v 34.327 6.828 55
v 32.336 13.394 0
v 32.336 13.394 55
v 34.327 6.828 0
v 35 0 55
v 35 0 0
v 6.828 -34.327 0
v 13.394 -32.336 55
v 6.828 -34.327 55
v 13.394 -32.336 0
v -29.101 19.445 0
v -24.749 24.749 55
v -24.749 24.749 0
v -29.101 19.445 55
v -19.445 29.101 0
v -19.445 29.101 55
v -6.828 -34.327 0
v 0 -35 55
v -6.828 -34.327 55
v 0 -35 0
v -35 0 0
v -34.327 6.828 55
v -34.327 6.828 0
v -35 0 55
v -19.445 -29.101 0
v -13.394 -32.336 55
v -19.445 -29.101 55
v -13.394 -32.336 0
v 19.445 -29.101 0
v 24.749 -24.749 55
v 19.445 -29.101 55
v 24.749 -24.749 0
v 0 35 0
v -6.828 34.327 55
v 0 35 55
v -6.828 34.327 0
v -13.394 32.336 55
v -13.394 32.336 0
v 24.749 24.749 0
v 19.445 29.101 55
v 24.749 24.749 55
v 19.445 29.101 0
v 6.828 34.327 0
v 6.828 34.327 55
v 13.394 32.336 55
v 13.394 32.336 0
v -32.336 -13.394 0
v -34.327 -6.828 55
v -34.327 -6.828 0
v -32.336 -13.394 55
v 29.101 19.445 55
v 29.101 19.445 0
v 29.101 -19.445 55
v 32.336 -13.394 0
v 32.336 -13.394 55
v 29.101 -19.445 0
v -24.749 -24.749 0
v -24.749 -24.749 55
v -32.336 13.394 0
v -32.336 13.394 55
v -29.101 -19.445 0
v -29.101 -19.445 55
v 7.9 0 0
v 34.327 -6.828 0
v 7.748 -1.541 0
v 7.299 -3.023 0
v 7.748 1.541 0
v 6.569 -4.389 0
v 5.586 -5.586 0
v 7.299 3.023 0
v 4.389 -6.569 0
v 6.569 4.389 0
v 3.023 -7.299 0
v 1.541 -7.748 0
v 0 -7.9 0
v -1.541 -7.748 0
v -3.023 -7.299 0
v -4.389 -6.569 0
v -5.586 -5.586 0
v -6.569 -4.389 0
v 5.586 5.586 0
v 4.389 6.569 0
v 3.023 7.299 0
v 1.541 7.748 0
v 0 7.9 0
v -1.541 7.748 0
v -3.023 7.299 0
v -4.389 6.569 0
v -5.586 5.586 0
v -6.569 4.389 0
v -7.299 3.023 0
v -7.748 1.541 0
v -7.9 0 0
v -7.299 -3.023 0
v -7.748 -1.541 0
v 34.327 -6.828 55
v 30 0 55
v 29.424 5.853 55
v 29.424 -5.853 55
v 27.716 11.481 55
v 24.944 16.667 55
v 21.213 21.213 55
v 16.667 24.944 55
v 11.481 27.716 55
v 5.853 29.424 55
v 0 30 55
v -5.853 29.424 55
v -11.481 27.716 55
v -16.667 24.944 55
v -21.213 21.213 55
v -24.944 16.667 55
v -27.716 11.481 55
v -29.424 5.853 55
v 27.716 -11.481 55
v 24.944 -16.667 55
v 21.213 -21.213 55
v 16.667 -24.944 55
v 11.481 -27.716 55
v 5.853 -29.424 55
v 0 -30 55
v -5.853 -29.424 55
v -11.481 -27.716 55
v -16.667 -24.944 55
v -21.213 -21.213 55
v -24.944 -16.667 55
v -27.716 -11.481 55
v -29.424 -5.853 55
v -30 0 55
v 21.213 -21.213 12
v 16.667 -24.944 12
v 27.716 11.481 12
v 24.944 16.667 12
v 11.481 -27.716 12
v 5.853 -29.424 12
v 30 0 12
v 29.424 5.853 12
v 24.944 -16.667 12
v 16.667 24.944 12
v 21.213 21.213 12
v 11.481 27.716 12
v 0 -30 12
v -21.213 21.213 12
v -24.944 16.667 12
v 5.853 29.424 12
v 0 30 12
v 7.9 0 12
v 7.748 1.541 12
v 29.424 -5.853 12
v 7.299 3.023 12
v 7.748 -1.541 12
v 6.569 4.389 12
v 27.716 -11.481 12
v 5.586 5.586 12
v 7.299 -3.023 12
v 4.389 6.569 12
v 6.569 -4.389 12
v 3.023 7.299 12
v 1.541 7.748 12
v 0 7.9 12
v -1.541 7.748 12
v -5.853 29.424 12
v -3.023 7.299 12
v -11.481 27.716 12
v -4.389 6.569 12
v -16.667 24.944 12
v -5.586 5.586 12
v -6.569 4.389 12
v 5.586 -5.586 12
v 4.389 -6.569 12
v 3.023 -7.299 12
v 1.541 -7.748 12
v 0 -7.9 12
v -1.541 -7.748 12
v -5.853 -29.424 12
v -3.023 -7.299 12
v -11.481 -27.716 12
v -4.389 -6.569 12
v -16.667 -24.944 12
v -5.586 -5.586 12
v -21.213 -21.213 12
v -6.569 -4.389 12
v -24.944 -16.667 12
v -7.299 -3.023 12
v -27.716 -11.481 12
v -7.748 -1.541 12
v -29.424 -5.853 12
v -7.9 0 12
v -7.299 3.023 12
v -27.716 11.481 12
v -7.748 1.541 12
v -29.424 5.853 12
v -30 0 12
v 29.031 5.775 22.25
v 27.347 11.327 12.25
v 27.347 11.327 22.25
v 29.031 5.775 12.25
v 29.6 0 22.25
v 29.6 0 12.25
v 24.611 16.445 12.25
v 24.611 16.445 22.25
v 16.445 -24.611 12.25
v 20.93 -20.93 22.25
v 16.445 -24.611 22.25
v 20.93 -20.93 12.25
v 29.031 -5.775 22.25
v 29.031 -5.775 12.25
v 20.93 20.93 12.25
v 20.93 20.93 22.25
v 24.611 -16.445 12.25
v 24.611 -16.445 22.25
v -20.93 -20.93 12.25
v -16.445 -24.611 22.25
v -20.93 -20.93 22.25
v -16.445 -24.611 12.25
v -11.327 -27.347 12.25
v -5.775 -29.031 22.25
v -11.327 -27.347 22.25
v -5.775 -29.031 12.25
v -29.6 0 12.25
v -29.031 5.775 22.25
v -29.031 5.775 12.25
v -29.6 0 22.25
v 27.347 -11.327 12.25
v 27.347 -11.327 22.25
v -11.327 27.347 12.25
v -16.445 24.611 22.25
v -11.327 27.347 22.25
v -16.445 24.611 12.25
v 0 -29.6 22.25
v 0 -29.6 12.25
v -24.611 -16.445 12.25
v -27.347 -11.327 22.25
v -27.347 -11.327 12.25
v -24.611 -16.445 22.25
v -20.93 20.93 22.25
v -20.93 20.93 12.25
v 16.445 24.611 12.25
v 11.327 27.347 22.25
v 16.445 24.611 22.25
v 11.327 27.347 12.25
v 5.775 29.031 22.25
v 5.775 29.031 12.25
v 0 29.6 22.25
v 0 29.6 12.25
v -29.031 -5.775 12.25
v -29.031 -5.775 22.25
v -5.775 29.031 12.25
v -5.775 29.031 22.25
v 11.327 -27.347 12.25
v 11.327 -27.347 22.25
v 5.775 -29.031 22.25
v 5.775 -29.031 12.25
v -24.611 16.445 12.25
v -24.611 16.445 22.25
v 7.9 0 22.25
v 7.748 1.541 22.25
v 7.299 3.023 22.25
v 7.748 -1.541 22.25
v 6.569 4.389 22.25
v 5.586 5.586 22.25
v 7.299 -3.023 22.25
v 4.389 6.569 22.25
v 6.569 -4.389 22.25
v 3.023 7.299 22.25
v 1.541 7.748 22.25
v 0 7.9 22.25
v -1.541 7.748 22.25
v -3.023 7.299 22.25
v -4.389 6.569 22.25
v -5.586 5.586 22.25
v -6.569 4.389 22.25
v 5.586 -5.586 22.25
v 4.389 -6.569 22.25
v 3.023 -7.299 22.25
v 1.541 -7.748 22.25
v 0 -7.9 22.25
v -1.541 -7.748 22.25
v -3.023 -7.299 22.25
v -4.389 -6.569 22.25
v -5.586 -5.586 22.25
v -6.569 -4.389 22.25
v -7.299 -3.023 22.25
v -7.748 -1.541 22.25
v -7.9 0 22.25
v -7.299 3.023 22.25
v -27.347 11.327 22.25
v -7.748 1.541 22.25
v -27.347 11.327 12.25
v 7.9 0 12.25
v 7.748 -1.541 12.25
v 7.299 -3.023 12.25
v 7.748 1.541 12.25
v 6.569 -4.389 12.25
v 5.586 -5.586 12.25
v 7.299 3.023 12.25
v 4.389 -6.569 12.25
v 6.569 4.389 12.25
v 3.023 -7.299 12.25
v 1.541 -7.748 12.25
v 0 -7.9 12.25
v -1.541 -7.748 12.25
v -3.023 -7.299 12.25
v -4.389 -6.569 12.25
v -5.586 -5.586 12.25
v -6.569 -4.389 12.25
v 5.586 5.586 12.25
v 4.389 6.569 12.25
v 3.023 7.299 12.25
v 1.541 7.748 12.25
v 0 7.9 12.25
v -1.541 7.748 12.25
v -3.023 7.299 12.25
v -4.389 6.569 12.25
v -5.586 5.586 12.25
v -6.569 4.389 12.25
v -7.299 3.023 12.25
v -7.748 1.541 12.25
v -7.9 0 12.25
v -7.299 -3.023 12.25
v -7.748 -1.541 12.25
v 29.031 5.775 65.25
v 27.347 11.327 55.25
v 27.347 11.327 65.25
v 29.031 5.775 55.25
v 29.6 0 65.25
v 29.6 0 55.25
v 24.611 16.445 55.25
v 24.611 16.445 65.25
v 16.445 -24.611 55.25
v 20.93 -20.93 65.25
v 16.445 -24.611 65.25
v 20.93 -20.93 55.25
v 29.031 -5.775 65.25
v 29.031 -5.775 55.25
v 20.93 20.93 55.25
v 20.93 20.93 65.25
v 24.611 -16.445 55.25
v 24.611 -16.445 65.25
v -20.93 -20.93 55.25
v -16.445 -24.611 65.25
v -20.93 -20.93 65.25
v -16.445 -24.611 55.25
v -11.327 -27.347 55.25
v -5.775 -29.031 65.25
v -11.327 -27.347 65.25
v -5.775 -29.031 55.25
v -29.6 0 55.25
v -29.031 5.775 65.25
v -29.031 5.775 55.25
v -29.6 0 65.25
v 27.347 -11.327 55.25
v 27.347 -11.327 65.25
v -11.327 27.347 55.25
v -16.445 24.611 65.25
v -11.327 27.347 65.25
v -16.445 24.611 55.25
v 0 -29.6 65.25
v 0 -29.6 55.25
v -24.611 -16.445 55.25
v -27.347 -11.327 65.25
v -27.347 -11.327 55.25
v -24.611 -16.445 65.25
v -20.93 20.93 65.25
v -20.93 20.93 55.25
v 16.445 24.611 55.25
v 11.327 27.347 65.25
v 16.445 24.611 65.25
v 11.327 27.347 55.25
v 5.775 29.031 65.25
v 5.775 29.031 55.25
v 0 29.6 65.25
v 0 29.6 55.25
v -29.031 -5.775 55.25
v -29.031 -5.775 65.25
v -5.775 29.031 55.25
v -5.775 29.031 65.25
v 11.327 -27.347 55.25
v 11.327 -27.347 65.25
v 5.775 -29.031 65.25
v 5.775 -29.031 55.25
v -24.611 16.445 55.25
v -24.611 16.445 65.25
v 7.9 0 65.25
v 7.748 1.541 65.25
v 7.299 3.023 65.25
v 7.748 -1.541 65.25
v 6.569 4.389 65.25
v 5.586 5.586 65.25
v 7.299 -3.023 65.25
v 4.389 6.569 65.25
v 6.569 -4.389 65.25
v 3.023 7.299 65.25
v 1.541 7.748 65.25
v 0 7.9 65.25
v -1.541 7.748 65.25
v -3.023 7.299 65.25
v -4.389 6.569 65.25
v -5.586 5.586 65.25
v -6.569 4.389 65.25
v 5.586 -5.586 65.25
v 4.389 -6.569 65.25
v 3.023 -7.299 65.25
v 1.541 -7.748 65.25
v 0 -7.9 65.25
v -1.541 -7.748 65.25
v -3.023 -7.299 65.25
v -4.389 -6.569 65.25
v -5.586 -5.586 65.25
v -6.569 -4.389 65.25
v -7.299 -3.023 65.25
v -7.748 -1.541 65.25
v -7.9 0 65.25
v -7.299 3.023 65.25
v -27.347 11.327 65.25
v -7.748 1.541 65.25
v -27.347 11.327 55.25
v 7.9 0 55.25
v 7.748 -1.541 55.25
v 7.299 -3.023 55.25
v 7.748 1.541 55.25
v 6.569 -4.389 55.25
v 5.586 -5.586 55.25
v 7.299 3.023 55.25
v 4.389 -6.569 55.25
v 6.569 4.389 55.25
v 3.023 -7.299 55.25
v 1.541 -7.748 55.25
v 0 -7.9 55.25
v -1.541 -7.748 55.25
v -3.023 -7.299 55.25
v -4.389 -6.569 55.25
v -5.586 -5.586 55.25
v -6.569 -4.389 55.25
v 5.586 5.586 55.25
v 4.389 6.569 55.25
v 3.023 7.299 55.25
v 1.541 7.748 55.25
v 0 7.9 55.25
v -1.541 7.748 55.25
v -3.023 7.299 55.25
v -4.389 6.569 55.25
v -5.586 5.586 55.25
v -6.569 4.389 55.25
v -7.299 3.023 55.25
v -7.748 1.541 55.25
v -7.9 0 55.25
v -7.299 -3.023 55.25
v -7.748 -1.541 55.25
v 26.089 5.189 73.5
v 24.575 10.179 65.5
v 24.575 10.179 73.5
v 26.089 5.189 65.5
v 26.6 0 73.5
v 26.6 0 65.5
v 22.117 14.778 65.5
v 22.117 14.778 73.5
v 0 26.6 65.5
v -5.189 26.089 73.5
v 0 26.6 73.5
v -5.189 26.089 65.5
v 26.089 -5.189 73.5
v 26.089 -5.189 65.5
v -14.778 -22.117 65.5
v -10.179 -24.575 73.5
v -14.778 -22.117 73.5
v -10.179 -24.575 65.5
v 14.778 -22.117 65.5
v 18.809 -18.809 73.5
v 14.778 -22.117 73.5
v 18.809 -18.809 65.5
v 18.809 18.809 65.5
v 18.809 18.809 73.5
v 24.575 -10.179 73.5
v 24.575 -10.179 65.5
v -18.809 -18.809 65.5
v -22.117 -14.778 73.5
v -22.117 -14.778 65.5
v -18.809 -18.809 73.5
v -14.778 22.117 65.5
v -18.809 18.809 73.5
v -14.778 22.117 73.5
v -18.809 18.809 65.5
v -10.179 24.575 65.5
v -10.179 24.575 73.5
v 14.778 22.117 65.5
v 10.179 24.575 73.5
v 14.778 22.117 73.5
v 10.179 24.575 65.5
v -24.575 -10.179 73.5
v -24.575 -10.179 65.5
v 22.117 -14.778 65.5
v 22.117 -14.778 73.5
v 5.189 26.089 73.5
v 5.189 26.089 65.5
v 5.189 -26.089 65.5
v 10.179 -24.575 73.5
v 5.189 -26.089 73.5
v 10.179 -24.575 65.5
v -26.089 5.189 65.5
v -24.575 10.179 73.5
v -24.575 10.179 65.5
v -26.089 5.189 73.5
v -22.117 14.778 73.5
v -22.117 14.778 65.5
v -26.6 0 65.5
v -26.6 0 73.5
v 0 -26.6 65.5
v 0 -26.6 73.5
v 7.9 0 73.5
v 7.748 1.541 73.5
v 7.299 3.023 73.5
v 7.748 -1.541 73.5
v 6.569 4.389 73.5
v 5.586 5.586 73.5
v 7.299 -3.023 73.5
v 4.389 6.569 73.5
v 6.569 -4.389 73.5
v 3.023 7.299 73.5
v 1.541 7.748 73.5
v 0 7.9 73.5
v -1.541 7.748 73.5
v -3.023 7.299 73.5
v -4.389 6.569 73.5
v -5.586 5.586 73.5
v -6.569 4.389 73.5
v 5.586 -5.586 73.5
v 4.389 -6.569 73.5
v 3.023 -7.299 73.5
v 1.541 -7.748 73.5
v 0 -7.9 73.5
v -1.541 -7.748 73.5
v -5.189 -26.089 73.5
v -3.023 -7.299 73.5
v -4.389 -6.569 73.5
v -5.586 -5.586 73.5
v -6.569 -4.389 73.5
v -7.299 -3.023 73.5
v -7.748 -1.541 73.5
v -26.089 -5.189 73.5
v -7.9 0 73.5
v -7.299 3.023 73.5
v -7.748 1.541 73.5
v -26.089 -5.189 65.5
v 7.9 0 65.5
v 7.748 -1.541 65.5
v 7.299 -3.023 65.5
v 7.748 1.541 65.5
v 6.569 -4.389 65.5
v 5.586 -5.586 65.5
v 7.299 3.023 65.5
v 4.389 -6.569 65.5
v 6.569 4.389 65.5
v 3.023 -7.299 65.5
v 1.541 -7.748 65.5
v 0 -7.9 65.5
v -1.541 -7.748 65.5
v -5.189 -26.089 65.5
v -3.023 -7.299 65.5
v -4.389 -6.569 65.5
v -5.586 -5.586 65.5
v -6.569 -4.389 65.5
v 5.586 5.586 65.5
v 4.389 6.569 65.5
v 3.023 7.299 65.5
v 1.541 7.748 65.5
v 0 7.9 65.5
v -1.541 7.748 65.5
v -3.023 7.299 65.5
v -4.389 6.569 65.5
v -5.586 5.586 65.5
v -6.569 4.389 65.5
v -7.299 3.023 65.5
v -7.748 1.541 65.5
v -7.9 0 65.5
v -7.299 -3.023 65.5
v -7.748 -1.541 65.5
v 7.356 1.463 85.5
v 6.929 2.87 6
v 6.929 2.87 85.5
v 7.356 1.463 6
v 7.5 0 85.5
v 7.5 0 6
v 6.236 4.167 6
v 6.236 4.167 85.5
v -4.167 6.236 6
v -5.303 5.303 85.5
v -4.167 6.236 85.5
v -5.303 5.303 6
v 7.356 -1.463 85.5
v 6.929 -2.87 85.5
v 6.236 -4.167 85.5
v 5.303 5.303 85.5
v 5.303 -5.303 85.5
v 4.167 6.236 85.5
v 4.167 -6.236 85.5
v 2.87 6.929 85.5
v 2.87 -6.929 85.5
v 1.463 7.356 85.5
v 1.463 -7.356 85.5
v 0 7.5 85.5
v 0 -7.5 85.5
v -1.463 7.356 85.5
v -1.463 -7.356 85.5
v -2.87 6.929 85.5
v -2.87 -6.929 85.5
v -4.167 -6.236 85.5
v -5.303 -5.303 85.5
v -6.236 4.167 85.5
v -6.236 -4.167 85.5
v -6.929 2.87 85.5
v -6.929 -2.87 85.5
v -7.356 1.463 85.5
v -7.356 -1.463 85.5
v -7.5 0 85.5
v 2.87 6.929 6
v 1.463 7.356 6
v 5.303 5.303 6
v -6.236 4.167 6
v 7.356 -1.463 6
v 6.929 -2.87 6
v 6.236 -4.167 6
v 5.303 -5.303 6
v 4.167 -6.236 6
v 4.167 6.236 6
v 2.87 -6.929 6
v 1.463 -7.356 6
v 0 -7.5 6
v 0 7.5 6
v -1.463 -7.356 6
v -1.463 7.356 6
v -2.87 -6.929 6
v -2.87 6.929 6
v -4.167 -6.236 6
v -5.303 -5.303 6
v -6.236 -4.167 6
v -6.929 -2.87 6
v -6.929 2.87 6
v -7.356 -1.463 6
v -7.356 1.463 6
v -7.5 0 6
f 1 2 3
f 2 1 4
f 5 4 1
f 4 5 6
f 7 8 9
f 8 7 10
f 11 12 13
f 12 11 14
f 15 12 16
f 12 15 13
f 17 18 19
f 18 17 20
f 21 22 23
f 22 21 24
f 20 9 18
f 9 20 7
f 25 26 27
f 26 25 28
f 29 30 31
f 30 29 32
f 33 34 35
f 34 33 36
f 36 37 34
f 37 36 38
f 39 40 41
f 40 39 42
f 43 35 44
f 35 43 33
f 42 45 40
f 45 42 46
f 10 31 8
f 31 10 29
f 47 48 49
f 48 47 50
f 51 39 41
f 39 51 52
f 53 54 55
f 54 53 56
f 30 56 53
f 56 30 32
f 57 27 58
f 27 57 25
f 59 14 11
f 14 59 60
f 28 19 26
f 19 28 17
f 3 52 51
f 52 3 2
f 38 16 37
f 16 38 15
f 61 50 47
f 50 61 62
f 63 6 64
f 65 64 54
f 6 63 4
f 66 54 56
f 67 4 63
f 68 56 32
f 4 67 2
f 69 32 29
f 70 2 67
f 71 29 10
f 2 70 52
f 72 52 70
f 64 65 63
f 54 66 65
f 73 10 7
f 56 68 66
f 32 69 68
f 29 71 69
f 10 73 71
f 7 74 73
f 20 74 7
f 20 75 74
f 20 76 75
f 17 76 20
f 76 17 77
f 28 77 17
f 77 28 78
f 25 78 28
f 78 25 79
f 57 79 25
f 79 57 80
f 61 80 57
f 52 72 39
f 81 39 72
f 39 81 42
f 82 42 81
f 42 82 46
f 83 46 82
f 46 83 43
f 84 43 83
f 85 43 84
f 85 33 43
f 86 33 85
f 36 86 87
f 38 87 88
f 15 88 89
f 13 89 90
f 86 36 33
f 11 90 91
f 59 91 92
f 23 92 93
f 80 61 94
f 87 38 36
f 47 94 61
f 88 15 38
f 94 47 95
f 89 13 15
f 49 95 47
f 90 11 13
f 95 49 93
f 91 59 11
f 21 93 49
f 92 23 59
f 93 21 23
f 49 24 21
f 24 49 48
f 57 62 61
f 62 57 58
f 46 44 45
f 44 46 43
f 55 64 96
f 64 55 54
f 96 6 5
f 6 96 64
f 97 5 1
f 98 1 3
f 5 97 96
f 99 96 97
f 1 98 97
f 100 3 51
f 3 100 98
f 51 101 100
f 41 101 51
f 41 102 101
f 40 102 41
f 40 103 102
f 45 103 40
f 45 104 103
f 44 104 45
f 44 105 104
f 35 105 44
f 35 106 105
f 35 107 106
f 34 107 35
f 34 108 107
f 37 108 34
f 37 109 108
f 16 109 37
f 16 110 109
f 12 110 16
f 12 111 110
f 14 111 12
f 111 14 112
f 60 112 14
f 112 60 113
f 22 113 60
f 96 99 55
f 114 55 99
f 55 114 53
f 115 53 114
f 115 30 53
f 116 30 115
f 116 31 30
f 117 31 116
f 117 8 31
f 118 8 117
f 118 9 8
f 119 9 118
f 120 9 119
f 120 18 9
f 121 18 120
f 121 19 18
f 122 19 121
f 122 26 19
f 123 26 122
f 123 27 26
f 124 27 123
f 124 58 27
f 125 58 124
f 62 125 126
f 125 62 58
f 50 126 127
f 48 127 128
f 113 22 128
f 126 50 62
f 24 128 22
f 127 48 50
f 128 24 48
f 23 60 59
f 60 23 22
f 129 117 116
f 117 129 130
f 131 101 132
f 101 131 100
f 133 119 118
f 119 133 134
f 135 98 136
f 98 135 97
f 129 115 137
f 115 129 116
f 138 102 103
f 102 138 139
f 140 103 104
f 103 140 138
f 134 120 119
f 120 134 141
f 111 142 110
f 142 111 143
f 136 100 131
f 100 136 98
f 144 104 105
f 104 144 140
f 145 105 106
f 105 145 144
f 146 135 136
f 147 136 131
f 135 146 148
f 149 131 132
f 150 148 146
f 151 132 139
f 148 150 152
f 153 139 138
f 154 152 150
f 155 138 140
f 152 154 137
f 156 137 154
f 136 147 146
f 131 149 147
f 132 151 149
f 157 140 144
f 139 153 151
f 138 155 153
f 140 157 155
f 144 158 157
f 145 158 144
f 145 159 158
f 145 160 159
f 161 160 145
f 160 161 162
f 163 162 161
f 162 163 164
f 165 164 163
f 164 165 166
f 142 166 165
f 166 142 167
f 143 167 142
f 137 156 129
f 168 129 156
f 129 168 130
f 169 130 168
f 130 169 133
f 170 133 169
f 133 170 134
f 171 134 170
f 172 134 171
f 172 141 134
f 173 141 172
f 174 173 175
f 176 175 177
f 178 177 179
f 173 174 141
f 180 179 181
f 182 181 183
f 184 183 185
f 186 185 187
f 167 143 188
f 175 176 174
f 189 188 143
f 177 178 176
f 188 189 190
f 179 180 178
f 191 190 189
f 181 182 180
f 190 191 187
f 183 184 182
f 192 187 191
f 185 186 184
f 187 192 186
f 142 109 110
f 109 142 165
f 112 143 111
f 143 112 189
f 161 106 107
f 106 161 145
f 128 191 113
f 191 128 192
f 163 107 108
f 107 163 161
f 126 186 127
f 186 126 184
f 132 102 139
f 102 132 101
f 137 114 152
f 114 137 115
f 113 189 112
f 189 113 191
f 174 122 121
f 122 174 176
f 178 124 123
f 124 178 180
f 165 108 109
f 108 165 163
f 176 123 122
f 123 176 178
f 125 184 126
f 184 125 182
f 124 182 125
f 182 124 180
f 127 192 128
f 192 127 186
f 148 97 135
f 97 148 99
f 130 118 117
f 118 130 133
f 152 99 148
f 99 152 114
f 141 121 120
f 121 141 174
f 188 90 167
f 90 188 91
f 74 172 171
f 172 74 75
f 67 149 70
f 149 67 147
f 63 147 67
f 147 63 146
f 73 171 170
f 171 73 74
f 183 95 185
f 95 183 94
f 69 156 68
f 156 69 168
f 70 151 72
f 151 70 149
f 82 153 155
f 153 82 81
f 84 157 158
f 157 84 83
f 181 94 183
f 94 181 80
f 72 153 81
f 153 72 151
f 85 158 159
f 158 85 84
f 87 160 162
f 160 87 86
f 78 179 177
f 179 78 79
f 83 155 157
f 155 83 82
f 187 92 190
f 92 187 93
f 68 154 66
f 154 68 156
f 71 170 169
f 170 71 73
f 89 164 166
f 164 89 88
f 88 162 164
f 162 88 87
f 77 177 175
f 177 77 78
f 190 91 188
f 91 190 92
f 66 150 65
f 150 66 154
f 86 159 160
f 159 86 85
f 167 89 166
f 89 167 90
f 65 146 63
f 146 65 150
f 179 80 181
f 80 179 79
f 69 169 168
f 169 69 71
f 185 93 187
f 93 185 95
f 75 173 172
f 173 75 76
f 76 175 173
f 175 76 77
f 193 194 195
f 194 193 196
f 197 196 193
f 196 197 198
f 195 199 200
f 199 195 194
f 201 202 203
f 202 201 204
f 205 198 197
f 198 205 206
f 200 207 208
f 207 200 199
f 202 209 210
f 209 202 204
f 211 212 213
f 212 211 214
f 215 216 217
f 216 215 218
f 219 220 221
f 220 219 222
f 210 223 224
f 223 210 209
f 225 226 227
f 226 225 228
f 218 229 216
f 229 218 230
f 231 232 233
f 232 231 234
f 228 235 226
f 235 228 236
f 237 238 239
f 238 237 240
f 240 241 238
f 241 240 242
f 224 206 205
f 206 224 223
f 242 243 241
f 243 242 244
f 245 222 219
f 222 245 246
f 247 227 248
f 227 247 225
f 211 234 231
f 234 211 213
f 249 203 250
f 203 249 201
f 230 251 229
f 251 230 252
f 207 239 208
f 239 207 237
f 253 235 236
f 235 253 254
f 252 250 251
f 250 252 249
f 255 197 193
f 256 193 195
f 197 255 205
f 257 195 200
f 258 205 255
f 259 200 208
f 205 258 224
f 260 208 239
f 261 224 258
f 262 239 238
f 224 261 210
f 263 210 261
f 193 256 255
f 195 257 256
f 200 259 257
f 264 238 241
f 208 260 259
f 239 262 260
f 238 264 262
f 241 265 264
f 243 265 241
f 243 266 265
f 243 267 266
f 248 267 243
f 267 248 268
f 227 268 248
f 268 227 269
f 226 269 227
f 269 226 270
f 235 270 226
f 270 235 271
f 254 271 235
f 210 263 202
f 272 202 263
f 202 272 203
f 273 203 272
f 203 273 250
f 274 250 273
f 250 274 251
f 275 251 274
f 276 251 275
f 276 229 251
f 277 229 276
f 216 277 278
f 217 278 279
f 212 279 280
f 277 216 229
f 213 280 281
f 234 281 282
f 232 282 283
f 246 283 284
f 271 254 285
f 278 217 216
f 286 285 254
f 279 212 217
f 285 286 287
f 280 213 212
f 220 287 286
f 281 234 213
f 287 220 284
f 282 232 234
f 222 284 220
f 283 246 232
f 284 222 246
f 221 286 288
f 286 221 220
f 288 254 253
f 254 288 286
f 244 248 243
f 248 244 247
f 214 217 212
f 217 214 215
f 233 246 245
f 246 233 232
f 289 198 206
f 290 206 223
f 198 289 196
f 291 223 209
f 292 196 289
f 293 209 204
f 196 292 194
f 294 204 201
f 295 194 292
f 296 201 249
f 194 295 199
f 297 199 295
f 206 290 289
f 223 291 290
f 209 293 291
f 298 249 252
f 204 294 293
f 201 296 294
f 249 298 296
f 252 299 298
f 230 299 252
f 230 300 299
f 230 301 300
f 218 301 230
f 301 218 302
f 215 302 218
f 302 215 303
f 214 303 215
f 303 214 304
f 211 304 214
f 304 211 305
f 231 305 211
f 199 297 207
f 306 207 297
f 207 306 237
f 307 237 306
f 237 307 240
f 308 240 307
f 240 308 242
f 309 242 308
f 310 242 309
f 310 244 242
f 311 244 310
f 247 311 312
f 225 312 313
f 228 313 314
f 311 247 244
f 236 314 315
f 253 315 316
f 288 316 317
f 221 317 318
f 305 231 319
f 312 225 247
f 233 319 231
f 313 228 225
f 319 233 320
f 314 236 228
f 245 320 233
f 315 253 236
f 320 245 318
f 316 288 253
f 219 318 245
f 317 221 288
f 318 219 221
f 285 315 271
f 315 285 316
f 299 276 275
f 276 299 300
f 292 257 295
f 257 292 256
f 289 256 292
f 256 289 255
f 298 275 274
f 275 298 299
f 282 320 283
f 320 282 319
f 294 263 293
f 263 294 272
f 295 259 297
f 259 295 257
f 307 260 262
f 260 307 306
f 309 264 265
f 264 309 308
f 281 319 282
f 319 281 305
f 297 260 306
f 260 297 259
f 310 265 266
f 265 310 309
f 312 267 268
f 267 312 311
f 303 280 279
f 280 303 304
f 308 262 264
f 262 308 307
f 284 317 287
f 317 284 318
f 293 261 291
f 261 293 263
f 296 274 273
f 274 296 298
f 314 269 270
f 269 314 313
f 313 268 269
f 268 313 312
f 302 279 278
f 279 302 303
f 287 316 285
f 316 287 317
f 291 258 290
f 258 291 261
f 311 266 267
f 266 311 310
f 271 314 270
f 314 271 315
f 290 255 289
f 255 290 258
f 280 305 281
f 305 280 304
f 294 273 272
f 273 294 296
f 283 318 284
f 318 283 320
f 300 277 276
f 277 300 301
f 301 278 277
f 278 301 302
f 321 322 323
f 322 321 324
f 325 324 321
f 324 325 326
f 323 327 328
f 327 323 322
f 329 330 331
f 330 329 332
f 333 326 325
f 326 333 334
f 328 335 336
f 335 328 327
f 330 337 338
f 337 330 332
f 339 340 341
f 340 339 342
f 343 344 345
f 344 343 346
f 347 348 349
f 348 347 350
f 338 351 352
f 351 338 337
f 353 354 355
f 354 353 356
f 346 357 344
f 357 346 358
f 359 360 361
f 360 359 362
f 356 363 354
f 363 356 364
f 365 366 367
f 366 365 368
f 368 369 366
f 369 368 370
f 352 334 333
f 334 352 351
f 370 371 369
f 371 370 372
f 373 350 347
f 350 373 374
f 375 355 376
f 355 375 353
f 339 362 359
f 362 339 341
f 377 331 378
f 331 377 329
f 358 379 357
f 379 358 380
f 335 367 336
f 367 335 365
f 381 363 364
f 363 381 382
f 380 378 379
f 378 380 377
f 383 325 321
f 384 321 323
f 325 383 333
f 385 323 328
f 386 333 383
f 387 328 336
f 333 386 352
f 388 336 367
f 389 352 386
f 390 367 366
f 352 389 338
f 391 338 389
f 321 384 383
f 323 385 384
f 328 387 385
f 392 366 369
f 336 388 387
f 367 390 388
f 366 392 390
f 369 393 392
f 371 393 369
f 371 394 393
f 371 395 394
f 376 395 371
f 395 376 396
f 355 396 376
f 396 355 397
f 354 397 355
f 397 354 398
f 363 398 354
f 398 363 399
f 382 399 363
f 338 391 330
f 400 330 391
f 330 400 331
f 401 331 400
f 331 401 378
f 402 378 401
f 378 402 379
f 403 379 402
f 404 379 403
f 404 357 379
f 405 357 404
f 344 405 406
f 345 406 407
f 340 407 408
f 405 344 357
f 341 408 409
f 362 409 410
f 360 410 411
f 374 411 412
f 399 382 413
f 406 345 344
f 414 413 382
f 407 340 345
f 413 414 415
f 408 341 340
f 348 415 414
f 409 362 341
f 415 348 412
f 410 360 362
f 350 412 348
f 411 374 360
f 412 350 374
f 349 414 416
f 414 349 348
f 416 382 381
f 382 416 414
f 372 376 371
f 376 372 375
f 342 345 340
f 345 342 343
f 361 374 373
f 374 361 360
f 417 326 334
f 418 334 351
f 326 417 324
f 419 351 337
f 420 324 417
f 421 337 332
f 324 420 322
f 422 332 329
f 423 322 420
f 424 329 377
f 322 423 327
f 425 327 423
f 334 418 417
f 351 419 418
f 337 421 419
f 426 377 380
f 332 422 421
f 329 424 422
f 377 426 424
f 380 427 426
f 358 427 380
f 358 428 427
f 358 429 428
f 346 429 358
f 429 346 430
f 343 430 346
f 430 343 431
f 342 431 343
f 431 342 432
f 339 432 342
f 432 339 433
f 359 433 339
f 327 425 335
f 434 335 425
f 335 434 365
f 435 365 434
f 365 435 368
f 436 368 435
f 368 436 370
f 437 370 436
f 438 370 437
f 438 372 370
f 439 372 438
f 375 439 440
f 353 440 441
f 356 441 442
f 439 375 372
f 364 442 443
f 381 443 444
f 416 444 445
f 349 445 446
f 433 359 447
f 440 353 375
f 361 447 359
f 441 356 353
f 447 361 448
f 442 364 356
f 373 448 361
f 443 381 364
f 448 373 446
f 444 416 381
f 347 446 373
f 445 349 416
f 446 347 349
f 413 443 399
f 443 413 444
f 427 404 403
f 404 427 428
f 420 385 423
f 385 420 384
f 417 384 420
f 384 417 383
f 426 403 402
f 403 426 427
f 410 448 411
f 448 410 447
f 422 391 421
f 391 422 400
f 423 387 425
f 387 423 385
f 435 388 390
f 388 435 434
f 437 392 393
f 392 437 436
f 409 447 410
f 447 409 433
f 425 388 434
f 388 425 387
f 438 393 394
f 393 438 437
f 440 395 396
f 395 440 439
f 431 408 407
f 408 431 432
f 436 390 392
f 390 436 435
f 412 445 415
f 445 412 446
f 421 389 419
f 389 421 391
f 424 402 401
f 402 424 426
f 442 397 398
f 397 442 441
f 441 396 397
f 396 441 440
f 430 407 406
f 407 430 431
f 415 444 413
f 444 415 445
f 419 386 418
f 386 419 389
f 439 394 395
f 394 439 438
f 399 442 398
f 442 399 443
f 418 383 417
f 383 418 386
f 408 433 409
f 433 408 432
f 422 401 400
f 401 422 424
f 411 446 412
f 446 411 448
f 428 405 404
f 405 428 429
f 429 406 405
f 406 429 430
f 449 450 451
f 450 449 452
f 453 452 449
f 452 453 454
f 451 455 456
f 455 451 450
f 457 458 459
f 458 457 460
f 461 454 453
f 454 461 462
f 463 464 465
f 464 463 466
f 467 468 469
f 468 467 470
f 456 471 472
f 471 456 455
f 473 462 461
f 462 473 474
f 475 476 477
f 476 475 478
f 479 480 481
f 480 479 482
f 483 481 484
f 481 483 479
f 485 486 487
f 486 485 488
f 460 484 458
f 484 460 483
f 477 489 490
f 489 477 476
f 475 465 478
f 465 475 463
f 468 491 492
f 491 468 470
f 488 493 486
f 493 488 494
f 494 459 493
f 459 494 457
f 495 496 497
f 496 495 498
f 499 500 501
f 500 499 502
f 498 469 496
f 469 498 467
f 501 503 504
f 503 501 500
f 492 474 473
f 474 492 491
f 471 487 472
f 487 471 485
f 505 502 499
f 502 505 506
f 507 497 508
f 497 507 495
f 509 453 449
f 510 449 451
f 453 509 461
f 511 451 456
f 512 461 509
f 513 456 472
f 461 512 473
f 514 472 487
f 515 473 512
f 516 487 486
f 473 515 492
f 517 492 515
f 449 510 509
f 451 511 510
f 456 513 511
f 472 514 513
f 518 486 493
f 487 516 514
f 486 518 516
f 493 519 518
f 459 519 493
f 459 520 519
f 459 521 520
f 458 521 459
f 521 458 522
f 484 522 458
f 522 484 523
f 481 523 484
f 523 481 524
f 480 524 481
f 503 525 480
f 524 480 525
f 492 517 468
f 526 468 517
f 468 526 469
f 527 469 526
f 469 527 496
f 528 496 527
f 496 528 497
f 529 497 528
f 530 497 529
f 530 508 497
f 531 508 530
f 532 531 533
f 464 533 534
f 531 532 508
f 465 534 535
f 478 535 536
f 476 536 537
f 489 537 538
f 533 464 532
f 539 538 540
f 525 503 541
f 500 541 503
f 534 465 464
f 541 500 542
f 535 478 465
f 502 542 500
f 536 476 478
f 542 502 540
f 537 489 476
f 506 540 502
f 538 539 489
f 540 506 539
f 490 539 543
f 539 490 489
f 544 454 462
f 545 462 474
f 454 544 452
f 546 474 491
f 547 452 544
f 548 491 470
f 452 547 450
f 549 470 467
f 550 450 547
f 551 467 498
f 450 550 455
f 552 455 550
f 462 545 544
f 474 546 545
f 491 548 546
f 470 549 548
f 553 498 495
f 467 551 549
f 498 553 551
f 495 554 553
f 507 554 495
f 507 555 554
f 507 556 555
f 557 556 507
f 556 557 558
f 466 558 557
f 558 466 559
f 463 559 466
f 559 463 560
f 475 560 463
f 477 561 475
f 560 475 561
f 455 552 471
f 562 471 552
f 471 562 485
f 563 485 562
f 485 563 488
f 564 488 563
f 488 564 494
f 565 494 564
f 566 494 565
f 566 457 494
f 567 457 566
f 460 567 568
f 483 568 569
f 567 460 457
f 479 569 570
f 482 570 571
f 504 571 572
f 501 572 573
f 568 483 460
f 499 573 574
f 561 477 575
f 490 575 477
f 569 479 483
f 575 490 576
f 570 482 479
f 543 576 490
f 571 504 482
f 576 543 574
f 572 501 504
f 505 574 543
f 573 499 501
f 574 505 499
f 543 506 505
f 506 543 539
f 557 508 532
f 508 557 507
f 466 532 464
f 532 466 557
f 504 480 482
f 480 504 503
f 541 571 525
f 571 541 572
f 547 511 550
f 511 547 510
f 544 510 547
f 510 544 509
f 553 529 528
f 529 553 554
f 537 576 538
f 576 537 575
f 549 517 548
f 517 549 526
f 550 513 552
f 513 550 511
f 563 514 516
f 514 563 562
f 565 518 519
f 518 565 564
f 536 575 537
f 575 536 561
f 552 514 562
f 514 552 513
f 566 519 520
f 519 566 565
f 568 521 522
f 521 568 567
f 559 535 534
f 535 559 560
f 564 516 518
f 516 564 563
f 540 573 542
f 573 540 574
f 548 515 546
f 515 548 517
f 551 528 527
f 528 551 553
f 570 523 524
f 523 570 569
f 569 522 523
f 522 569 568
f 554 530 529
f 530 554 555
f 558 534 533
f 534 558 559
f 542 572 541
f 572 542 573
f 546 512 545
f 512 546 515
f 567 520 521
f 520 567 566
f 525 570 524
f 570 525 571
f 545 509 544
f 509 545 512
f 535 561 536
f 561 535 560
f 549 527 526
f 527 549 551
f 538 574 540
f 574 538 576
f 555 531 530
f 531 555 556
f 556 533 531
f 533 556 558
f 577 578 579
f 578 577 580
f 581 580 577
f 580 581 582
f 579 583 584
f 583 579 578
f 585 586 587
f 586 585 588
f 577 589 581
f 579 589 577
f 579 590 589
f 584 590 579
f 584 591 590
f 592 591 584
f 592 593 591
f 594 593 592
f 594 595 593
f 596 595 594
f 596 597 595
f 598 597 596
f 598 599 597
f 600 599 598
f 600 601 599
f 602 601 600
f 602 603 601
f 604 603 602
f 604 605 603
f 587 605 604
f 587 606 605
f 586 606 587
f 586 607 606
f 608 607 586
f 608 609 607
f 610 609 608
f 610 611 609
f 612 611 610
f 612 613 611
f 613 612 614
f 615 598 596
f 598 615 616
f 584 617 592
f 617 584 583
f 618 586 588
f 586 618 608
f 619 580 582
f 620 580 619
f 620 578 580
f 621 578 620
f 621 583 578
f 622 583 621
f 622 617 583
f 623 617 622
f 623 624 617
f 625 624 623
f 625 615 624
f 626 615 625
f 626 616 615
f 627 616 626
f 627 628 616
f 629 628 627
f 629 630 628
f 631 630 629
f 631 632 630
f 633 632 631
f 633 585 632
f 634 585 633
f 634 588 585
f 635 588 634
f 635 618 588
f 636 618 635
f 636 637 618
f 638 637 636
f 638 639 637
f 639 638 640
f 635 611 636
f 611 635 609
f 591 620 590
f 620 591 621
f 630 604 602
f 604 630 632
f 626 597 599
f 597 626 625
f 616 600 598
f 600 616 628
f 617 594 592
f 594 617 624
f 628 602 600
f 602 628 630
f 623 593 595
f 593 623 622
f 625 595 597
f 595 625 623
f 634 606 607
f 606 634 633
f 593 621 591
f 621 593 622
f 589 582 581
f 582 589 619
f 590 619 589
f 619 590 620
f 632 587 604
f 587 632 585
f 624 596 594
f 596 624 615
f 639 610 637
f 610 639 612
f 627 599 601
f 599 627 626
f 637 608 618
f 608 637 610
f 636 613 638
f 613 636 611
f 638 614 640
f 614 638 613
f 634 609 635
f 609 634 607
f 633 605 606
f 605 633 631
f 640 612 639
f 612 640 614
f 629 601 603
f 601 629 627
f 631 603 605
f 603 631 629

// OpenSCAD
$fn = 32;

// ------------------------------------------------------------------------
// Bearing housing: housing d70, two bearings and a shaft
// Every part is its own module, assembly() places them once.
// ------------------------------------------------------------------------

// --- part 1 ---
module housing() {
  difference() {
    cylinder(h = 55, d = 70);
    translate([0, 0, 12]) cylinder(h = 44, d = 60);
    translate([0, 0, -1]) cylinder(h = 14, d = 15.8);
  }
}

// --- part 2 ---
module bearing_lower() {
  difference() {
      translate([0, 0, 0]) cylinder(h = 10, d = 59.2);
      translate([0, 0, -1]) cylinder(h = 12, d = 15.8);
    }
}

// --- part 3 ---
module bearing_upper() {
  difference() {
      translate([0, 0, 0]) cylinder(h = 10, d = 59.2);
      translate([0, 0, -1]) cylinder(h = 12, d = 15.8);
    }
}

// --- part 4 ---
module spacer() {
  difference() {
      translate([0, 0, 0]) cylinder(h = 8, d = 53.2);
      translate([0, 0, -1]) cylinder(h = 10, d = 15.8);
    }
}

// --- part 5 ---
module shaft() {
  translate([0, 0, -39.75]) cylinder(h = 79.5, d = 15);
}

// --- assembly ---
module assembly() {
  translate([0, 0, 0]) rotate([0, 0, 0]) housing();
  translate([0, 0, 12.25]) rotate([0, 0, 0]) bearing_lower();
  translate([0, 0, 55.25]) rotate([0, 0, 0]) bearing_upper();
  translate([0, 0, 65.5]) rotate([0, 0, 0]) spacer();
  translate([0, 0, 45.75]) rotate([0, 0, 0]) shaft();
}

assembly();
